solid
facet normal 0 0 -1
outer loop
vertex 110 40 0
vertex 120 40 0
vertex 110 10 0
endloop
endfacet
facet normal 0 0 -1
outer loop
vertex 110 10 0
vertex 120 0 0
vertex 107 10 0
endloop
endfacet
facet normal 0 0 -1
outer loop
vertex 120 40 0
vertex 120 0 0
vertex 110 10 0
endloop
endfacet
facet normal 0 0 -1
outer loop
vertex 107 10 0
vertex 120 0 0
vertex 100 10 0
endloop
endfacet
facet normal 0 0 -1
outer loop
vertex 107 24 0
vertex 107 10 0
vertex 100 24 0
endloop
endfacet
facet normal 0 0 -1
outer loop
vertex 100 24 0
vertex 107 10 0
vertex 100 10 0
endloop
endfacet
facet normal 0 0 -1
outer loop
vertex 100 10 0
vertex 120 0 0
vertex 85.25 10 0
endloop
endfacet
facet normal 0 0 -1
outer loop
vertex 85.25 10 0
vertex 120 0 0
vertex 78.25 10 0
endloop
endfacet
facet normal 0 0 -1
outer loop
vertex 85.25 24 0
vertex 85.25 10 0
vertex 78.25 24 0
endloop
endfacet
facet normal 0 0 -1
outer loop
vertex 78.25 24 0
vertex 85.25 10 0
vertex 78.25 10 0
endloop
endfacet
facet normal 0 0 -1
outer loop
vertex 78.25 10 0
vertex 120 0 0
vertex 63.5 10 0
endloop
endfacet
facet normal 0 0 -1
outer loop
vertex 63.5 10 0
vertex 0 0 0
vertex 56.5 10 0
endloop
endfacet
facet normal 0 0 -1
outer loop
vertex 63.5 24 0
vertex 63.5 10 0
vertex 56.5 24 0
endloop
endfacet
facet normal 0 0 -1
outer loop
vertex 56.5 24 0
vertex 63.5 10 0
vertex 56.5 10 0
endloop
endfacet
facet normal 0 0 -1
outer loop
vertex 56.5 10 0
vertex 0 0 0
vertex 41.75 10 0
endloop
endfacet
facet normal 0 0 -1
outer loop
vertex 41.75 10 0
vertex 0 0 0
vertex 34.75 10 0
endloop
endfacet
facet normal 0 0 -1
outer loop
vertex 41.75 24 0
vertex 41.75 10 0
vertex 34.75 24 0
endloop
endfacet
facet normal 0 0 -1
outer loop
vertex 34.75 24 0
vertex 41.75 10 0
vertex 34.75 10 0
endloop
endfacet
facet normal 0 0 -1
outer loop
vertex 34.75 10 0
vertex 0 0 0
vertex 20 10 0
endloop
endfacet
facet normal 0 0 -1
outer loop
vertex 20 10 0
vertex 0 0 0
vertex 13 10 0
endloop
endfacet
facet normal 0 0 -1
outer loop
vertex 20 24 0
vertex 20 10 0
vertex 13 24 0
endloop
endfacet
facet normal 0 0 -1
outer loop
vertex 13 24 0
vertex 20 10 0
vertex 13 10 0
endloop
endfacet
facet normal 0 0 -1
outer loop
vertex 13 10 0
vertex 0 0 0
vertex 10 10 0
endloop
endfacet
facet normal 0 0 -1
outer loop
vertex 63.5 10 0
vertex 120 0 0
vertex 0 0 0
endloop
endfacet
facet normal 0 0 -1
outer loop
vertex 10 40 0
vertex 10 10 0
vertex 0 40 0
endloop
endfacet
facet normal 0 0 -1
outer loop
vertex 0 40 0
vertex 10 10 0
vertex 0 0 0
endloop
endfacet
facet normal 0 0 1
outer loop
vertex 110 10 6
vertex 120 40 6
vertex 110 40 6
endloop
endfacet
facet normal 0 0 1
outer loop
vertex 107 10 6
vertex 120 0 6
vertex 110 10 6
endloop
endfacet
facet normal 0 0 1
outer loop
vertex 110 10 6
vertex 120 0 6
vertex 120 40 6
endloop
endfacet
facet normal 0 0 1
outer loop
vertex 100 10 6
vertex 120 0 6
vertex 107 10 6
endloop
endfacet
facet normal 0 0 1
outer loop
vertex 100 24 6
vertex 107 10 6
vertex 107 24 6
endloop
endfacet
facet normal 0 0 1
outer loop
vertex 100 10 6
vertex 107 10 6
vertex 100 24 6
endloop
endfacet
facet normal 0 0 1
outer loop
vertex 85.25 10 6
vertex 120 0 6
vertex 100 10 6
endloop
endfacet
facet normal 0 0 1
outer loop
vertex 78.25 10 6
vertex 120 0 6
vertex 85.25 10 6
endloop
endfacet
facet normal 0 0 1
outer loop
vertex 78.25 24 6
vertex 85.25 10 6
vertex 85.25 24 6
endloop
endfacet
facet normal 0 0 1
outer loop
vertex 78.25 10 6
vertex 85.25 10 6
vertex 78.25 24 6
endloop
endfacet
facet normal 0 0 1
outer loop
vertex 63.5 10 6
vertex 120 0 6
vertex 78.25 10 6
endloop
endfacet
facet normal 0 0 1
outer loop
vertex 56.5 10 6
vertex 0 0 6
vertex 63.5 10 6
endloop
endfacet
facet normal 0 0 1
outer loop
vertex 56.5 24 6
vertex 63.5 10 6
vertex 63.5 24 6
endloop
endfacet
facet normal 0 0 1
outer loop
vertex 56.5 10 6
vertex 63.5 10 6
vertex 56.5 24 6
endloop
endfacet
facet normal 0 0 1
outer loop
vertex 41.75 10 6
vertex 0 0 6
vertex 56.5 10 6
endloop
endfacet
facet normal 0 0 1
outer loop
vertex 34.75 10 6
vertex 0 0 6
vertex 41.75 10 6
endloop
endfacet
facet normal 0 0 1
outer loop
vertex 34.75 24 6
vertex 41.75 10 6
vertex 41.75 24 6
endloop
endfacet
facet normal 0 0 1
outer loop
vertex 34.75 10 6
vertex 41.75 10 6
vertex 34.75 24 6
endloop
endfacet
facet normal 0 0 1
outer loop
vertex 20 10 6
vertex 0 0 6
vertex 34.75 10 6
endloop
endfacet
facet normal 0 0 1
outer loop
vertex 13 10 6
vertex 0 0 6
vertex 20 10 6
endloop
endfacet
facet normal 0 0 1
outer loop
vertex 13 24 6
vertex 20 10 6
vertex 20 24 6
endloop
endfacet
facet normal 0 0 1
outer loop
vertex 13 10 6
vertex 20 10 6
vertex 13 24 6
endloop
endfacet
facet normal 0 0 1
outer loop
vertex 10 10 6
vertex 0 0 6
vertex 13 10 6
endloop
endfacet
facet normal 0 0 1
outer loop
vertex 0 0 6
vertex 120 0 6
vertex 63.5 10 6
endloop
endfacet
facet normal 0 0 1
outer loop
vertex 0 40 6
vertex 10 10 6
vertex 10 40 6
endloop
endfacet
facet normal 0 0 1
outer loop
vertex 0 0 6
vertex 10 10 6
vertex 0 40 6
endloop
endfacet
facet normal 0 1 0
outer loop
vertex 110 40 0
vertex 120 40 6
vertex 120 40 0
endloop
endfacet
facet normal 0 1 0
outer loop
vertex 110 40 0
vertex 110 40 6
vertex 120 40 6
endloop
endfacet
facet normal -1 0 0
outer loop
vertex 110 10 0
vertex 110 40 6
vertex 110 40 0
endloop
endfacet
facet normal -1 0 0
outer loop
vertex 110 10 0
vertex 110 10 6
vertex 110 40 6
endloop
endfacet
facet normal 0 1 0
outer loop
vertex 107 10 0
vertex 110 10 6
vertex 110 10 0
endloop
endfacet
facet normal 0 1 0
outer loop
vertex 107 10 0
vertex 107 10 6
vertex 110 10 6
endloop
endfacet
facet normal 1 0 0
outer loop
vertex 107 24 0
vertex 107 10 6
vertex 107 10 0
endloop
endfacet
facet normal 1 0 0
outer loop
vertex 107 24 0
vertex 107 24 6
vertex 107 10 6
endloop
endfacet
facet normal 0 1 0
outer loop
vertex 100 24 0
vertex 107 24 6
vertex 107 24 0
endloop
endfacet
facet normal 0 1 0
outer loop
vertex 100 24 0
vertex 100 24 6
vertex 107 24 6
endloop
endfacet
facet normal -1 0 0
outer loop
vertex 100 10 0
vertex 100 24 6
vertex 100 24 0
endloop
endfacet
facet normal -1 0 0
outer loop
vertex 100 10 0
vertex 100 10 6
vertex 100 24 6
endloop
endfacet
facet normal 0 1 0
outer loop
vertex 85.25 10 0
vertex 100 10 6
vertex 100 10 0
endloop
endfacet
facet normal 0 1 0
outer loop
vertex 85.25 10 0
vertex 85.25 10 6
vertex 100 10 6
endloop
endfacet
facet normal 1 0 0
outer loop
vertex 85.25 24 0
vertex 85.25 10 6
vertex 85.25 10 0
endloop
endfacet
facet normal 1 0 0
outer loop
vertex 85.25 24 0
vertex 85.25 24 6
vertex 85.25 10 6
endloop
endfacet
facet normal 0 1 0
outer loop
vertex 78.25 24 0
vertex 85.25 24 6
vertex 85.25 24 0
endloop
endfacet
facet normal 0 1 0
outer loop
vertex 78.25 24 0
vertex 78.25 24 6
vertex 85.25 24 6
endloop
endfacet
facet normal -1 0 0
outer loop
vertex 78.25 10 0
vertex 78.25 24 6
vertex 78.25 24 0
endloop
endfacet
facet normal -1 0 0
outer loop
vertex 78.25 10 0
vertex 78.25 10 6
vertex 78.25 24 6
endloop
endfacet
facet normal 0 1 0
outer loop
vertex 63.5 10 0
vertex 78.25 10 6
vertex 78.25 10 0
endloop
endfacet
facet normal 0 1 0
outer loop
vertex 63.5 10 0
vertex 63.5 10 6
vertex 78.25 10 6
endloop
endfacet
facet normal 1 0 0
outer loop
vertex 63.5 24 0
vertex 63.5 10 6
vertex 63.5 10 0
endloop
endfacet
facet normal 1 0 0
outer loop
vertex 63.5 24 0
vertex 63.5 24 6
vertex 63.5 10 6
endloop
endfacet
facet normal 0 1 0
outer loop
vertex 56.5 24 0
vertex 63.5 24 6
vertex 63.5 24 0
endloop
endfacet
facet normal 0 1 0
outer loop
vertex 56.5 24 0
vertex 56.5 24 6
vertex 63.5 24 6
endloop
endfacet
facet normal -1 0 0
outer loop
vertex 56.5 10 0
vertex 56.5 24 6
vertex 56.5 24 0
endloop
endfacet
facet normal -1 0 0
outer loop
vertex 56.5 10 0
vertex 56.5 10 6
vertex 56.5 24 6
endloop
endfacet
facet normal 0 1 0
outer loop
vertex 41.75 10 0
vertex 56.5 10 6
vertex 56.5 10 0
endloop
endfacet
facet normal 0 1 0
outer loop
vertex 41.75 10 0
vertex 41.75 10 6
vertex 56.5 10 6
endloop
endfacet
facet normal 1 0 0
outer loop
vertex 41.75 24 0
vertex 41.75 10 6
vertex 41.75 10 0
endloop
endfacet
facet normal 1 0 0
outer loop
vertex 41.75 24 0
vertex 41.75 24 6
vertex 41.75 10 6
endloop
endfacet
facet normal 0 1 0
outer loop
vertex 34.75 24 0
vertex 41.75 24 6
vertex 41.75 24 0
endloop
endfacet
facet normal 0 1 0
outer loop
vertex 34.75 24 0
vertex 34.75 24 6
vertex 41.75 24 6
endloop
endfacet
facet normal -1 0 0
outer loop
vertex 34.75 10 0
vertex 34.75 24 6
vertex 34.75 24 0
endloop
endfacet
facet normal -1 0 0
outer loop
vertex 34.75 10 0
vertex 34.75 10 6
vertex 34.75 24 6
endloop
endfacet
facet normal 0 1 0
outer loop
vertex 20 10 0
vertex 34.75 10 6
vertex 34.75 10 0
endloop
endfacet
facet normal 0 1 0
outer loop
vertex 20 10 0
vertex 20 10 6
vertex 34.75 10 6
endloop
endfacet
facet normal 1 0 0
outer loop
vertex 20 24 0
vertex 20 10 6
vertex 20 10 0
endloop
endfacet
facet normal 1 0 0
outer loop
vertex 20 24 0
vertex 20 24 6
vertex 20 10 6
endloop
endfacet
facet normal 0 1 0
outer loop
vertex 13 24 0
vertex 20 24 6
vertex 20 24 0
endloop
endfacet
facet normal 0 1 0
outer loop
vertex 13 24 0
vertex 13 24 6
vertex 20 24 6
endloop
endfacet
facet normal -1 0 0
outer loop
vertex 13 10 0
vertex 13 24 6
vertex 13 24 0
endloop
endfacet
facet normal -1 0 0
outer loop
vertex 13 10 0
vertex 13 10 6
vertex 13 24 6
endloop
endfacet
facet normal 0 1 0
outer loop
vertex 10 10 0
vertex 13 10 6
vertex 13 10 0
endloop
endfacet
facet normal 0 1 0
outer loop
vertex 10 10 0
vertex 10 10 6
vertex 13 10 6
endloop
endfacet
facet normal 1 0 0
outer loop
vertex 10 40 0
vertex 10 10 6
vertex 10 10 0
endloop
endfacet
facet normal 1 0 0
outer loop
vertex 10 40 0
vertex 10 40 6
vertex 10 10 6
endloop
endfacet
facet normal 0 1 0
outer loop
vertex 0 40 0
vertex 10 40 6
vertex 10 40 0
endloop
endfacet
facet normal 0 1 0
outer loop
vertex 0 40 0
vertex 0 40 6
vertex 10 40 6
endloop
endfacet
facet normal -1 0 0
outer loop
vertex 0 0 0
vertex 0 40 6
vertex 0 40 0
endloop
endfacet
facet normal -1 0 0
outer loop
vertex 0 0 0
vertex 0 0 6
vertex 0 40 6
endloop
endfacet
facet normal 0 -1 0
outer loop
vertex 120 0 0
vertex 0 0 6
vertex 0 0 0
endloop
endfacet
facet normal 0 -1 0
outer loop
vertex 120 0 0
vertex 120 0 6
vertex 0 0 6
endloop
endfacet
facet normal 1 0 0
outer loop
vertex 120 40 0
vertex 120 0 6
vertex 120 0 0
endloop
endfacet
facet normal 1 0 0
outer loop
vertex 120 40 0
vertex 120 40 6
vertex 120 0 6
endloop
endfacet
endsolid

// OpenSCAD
$fn = 32;

// ----------------------------------------------------------------------
// Guard grille: 5 slats over a 120 x 40 mm plate
// ----------------------------------------------------------------------

// --- parameters (mm) ---
profile_height = 6;       // extrusion height
profile_points = 28;      // points of the closed outline

profile = [[0, 0], [120, 0], [120, 40], [110, 40], [110, 10], [107, 10], [107, 24], [100, 24], [100, 10], [85.25, 10], [85.25, 24], [78.25, 24], [78.25, 10], [63.5, 10], [63.5, 24], [56.5, 24], [56.5, 10], [41.75, 10], [41.75, 24], [34.75, 24], [34.75, 10], [20, 10], [20, 24], [13, 24], [13, 10], [10, 10], [10, 40], [0, 40]];  // single closed polygon, 28 points, counter clockwise

// --- the one profile operation ---
linear_extrude(height = profile_height) polygon(points = profile);
